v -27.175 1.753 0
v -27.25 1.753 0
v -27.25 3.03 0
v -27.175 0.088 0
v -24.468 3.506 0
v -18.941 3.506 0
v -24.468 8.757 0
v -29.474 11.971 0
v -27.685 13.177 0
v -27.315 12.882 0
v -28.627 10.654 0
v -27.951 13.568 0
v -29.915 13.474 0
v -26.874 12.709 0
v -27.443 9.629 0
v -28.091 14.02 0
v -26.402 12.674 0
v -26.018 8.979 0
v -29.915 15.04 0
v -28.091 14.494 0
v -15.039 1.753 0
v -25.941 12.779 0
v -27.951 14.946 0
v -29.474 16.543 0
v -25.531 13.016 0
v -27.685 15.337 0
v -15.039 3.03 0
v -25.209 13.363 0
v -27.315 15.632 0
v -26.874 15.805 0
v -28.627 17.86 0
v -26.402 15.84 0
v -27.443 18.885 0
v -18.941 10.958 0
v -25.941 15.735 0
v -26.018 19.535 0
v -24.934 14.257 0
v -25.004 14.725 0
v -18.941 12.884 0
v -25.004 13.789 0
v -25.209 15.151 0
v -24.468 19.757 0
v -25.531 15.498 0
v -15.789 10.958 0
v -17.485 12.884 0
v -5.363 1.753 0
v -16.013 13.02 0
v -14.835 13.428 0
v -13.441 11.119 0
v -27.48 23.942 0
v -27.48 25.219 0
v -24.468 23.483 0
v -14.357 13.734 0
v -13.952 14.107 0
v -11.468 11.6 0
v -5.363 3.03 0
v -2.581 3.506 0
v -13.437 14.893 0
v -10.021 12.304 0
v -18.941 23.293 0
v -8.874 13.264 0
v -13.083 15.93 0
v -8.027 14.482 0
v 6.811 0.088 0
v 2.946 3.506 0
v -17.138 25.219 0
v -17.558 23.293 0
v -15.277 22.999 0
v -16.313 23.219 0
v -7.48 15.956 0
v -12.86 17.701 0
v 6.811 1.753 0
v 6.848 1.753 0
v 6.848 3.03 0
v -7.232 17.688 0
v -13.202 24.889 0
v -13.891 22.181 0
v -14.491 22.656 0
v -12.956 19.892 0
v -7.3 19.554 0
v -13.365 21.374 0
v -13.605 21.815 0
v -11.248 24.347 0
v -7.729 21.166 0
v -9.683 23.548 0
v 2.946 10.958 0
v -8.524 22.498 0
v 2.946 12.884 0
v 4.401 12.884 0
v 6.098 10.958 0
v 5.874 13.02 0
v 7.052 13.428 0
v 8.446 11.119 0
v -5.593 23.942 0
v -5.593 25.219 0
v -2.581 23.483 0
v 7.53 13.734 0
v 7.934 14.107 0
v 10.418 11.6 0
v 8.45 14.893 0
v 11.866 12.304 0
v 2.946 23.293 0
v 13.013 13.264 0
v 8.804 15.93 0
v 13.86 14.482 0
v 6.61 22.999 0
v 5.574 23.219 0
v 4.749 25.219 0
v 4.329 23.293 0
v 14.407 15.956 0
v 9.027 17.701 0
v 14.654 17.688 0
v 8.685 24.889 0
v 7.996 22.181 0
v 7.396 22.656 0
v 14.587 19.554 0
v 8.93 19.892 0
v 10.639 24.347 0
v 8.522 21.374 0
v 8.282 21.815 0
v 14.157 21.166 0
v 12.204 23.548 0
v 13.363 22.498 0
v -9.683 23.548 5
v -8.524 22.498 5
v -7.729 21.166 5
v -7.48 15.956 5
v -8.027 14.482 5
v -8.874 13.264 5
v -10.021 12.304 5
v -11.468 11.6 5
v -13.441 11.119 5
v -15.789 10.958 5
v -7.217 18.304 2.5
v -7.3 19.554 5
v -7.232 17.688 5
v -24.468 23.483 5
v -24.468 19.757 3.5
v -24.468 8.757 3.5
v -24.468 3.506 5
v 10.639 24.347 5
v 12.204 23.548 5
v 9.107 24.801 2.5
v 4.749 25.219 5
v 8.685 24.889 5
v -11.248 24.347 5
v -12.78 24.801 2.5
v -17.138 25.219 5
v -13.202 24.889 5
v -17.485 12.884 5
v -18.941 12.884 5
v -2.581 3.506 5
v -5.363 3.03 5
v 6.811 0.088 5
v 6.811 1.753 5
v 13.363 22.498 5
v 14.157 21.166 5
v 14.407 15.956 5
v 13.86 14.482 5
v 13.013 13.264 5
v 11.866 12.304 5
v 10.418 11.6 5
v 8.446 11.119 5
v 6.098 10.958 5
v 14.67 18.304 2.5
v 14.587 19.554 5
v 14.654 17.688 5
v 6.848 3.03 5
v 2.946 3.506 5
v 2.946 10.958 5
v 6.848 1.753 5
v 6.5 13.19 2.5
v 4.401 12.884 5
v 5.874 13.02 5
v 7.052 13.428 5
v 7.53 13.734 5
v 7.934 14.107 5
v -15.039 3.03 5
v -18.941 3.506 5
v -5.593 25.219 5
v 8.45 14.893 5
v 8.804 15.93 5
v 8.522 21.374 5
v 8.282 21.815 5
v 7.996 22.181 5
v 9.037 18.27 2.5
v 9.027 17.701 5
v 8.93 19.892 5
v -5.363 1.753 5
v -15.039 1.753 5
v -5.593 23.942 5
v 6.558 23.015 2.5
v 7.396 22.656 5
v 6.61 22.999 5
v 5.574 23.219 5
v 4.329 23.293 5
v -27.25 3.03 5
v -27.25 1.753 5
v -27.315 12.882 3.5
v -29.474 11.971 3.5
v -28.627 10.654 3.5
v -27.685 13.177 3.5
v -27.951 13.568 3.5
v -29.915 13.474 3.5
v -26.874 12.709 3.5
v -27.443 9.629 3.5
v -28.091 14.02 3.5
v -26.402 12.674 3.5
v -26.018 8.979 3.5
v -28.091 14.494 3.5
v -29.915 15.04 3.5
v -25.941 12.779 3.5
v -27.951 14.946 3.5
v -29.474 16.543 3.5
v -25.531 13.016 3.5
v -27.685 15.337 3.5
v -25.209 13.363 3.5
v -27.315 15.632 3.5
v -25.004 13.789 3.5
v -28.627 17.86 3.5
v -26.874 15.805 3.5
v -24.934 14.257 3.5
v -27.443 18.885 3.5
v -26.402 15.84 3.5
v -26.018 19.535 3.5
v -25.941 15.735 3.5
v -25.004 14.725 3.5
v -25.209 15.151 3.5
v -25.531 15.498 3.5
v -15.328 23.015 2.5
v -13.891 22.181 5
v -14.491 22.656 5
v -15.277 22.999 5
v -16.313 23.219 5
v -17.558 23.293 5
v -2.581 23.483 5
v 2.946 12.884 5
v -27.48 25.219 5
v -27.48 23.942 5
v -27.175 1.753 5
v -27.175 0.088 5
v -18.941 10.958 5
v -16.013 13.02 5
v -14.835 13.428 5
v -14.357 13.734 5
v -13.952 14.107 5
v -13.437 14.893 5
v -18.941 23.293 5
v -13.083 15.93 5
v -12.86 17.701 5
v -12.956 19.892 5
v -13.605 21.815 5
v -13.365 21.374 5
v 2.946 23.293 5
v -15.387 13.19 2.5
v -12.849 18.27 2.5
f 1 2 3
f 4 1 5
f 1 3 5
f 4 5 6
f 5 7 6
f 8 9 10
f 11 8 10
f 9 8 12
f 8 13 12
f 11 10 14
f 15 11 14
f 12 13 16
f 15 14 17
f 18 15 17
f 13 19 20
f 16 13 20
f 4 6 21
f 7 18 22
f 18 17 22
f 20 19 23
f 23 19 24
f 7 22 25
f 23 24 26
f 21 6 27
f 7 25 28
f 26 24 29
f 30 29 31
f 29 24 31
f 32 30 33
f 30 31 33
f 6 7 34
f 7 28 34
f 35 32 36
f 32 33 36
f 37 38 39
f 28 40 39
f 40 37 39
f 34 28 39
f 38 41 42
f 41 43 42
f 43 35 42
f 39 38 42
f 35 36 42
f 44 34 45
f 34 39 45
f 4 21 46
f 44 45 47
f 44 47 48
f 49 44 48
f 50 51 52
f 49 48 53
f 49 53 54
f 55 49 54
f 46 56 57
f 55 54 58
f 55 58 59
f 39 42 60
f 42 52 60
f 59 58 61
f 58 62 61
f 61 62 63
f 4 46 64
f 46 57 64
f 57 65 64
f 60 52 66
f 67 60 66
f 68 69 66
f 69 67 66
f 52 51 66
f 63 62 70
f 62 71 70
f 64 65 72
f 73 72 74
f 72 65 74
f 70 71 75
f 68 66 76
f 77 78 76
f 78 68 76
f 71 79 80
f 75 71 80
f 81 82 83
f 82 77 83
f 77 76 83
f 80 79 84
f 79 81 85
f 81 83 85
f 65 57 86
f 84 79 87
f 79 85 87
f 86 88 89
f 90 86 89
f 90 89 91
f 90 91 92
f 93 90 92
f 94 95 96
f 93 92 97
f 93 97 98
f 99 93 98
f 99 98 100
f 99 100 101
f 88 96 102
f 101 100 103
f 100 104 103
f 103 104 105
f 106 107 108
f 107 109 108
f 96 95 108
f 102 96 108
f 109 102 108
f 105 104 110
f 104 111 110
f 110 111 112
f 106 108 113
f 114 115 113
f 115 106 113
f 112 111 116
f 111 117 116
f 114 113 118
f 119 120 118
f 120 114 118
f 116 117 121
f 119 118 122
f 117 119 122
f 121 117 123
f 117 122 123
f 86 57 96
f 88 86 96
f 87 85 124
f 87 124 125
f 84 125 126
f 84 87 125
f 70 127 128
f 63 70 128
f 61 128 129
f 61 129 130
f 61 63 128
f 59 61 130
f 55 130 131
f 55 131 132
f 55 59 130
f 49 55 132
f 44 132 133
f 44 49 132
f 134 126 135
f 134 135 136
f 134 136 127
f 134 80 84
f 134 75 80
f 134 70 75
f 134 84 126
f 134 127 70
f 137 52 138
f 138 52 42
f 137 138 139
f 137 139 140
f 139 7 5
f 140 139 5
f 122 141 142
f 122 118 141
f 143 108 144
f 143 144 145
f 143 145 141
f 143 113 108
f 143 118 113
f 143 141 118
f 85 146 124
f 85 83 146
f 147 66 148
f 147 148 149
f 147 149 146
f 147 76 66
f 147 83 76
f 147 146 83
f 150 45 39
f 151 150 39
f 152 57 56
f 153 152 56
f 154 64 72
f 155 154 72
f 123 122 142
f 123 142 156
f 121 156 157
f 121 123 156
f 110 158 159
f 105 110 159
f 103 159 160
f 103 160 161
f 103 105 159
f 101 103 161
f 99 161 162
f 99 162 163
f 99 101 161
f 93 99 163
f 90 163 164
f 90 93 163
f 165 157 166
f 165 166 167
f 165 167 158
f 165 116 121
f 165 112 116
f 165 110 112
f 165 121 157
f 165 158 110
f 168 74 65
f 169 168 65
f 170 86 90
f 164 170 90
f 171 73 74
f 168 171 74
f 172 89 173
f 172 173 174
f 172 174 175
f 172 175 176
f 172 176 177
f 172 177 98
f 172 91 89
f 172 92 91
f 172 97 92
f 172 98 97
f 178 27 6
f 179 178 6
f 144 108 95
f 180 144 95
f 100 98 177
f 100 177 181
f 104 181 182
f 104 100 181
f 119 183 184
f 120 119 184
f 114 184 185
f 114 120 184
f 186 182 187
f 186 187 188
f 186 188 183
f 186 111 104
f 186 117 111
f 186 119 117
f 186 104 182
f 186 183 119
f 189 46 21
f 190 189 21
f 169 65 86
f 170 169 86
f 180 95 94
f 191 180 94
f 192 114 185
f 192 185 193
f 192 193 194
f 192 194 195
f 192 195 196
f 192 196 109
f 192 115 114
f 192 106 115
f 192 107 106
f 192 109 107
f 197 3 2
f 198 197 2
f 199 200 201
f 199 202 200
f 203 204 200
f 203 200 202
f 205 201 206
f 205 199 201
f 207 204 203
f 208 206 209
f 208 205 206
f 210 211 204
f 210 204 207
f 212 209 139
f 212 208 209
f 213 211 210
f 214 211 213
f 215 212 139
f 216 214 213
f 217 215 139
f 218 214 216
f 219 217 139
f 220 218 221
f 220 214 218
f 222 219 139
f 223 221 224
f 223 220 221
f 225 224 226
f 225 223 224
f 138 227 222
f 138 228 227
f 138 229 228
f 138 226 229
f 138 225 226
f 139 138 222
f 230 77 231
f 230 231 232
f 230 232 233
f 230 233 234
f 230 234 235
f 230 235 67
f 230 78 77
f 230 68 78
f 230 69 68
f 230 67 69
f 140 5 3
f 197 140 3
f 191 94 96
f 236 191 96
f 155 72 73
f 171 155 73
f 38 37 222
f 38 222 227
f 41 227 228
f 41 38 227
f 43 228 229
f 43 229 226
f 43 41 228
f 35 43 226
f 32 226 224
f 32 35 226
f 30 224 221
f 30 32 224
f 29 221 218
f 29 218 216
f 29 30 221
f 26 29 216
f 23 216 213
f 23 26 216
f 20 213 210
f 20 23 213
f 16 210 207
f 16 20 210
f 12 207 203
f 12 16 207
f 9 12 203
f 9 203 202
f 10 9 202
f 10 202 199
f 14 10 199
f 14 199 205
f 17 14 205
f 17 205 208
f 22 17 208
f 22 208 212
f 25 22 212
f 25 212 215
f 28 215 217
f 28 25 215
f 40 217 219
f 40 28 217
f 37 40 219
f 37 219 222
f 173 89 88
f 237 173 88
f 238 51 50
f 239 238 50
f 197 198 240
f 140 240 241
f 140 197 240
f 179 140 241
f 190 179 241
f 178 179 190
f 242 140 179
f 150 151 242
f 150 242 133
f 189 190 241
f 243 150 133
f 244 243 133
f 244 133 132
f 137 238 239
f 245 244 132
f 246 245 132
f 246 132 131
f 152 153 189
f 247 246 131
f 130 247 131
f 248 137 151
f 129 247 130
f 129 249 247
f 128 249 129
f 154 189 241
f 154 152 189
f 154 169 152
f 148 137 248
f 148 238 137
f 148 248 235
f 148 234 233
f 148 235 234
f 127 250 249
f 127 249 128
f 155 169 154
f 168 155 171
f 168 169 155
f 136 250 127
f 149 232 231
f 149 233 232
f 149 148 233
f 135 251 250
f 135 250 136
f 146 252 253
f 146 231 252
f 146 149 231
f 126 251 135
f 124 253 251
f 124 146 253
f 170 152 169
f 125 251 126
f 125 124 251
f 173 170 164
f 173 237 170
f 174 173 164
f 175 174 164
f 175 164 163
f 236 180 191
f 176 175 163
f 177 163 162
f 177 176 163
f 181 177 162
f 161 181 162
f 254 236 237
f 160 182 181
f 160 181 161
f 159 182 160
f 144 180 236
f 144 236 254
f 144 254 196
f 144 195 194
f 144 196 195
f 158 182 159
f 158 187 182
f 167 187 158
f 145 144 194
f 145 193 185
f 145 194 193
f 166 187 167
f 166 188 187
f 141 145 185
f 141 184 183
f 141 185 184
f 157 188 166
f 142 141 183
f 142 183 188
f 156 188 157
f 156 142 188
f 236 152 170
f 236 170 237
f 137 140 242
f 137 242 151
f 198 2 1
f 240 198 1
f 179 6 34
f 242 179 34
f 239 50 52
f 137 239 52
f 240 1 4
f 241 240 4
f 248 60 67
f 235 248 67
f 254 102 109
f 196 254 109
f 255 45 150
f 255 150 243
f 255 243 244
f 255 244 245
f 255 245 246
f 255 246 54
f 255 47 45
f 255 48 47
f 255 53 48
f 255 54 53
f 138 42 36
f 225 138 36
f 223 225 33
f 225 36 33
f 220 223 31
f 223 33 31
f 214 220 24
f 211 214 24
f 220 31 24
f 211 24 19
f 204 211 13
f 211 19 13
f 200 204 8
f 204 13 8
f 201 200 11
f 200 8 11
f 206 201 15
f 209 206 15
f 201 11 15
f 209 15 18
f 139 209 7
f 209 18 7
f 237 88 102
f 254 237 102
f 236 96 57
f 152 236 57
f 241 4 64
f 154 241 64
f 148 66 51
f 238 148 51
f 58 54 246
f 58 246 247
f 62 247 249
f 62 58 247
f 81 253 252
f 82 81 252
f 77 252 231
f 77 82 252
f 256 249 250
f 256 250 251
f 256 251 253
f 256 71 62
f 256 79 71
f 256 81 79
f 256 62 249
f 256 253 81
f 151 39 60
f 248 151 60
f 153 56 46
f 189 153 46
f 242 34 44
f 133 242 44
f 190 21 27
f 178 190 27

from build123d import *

# Parameters (mm, degrees)
F1_DEPTH = 5
F0_R     = 1.5875
F2_DEPTH = 3.5


# Not quite as in the source:
# - a feature names something its author has since deleted; it is built from what else it names


with BuildPart() as f1:
    # F0 (on Top) → F1 (new body)
    with BuildSketch(Plane.XY):
        with BuildLine():
            Line((-27.2502941939, 1.753040044), (-27.1751960216, 1.753040044))
            Line((-27.1751960216, 1.753040044), (-15.0386480573, 1.753040044))
            Line((-15.0386480573, 1.753040044), (-15.0386480573, 3.0296357887))
            Line((-15.0386480573, 3.0296357887), (-18.9412236452, 3.5055596409))
            Line((-18.9412236452, 3.5055596409), (-18.9412236452, 10.9579672556))
            Line((-18.9412236452, 10.9579672556), (-15.7889280125, 10.9579672556))
            add(Edge.make_bspline(
                [(-7.216699569, 18.3039918917), (-7.216699569, 10.9579672556), (-15.7889280125, 10.9579672556)],
                knots=[0, 0, 0, 1, 1, 1], degree=2))
            add(Edge.make_bspline(
                [(-9.6831049442, 23.5475529219), (-7.216699569, 21.8762203352), (-7.216699569, 18.3039918917)],
                knots=[0, 0, 0, 1, 1, 1], degree=2))
            add(Edge.make_bspline(
                [(-17.138312111, 25.2188855087), (-12.1495103193, 25.2188855087), (-9.6831049442, 23.5475529219)],
                knots=[0, 0, 0, 1, 1, 1], degree=2))
            Line((-17.138312111, 25.2188855087), (-27.4798574638, 25.2188855087))
            Line((-27.4798574638, 25.2188855087), (-27.4798574638, 23.942289764))
            Line((-27.4798574638, 23.942289764), (-24.4675394346, 23.4831632243))
            Line((-24.4675394346, 23.4831632243), (-24.4675394346, 19.757044316))
            ThreePointArc((-24.4675394346, 19.757044316), (-20.580748307, 18.1448768508), (-18.9710911065, 14.2570454627))
            ThreePointArc((-18.9710911065, 14.2570454627), (-20.580748307, 10.3692140746), (-24.4675394346, 8.7570466095))
            Line((-24.4675394346, 8.7570466095), (-24.4675394346, 3.5055596409))
            Line((-24.4675394346, 3.5055596409), (-27.2502941939, 3.0296357887))
            Line((-27.2502941939, 3.0296357887), (-27.2502941939, 1.753040044))
        make_face()
        with BuildLine():
            add(Edge.make_bspline(
                [(-12.8493983372, 18.2703972668), (-12.8493983372, 21.0699493385), (-13.8908317079, 22.181371511)],
                knots=[0, 0, 0, 1, 1, 1], degree=2))
            add(Edge.make_bspline(
                [(-13.9524218535, 14.1074633363), (-12.8493983372, 15.3308675916), (-12.8493983372, 18.2703972668)],
                knots=[0, 0, 0, 1, 1, 1], degree=2))
            add(Edge.make_bspline(
                [(-17.4854565679, 12.884059081), (-15.0554453697, 12.884059081), (-13.9524218535, 14.1074633363)],
                knots=[0, 0, 0, 1, 1, 1], degree=2))
            Line((-17.4854565679, 12.884059081), (-18.9412236452, 12.884059081))
            Line((-18.9412236452, 12.884059081), (-18.9412236452, 23.2927936834))
            Line((-18.9412236452, 23.2927936834), (-17.5582449218, 23.2927936834))
            add(Edge.make_bspline(
                [(-13.8908317079, 22.181371511), (-14.9322650785, 23.2927936834), (-17.5582449218, 23.2927936834)],
                knots=[0, 0, 0, 1, 1, 1], degree=2))
        make_face(mode=Mode.SUBTRACT)
        Polygon((-15.0386480573, 1.753040044), (-27.1751960216, 1.753040044), (-27.1751960216, 0.0879431242), (6.8105147628, 0.0879431242), (6.8105147628, 1.753040044), (-5.3633960976, 1.753040044), align=None)
        with BuildLine():
            Line((-5.3633960976, 3.0296357887), (-5.3633960976, 1.753040044))
            Line((-5.3633960976, 1.753040044), (6.8105147628, 1.753040044))
            Line((6.8105147628, 1.753040044), (6.848250039, 1.753040044))
            Line((6.848250039, 1.753040044), (6.848250039, 3.0296357887))
            Line((6.848250039, 3.0296357887), (2.9456744511, 3.5055596409))
            Line((2.9456744511, 3.5055596409), (2.9456744511, 10.9579672556))
            Line((2.9456744511, 10.9579672556), (6.0979700838, 10.9579672556))
            add(Edge.make_bspline(
                [(14.6701985273, 18.3039918917), (14.6701985273, 10.9579672556), (6.0979700838, 10.9579672556)],
                knots=[0, 0, 0, 1, 1, 1], degree=2))
            add(Edge.make_bspline(
                [(12.2037931521, 23.5475529219), (14.6701985273, 21.8762203352), (14.6701985273, 18.3039918917)],
                knots=[0, 0, 0, 1, 1, 1], degree=2))
            add(Edge.make_bspline(
                [(4.7485859853, 25.2188855087), (9.737387777, 25.2188855087), (12.2037931521, 23.5475529219)],
                knots=[0, 0, 0, 1, 1, 1], degree=2))
            Line((4.7485859853, 25.2188855087), (-5.5929593675, 25.2188855087))
            Line((-5.5929593675, 25.2188855087), (-5.5929593675, 23.942289764))
            Line((-5.5929593675, 23.942289764), (-2.5806413383, 23.4831632243))
            Line((-2.5806413383, 23.4831632243), (-2.5806413383, 3.5055596409))
            Line((-2.5806413383, 3.5055596409), (-5.3633960976, 3.0296357887))
        make_face()
        with BuildLine():
            add(Edge.make_bspline(
                [(9.0374997591, 18.2703972668), (9.0374997591, 21.0699493385), (7.9960663884, 22.181371511)],
                knots=[0, 0, 0, 1, 1, 1], degree=2))
            add(Edge.make_bspline(
                [(7.9344762428, 14.1074633363), (9.0374997591, 15.3308675916), (9.0374997591, 18.2703972668)],
                knots=[0, 0, 0, 1, 1, 1], degree=2))
            add(Edge.make_bspline(
                [(4.4014415284, 12.884059081), (6.8314527266, 12.884059081), (7.9344762428, 14.1074633363)],
                knots=[0, 0, 0, 1, 1, 1], degree=2))
            Line((4.4014415284, 12.884059081), (2.9456744511, 12.884059081))
            Line((2.9456744511, 12.884059081), (2.9456744511, 23.2927936834))
            Line((2.9456744511, 23.2927936834), (4.3286531745, 23.2927936834))
            add(Edge.make_bspline(
                [(7.9960663884, 22.181371511), (6.9546330178, 23.2927936834), (4.3286531745, 23.2927936834)],
                knots=[0, 0, 0, 1, 1, 1], degree=2))
        make_face(mode=Mode.SUBTRACT)
        with BuildLine():
            Line((-24.4675394346, 19.757044316), (-24.4675394346, 8.7570466095))
            ThreePointArc((-24.4675394346, 8.7570466095), (-20.580748307, 10.3692140746), (-18.9710911065, 14.2570454627))
            ThreePointArc((-18.9710911065, 14.2570454627), (-20.580748307, 18.1448768508), (-24.4675394346, 19.757044316))
        make_face()
    extrude(amount=F1_DEPTH)

    # F0 (on Top) → F2 (join)
    with BuildSketch(Plane.XY):
        with BuildLine():
            ThreePointArc((-24.4675394346, 19.757044316), (-29.9710911065, 14.2570454627), (-24.4675394346, 8.7570466095))
            Line((-24.4675394346, 8.7570466095), (-24.4675394346, 19.757044316))
        make_face()
        with Locations((-26.5210345387, 14.2570454627)):
            Circle(F0_R, mode=Mode.SUBTRACT)
    extrude(amount=F2_DEPTH)


solid = f1.part
